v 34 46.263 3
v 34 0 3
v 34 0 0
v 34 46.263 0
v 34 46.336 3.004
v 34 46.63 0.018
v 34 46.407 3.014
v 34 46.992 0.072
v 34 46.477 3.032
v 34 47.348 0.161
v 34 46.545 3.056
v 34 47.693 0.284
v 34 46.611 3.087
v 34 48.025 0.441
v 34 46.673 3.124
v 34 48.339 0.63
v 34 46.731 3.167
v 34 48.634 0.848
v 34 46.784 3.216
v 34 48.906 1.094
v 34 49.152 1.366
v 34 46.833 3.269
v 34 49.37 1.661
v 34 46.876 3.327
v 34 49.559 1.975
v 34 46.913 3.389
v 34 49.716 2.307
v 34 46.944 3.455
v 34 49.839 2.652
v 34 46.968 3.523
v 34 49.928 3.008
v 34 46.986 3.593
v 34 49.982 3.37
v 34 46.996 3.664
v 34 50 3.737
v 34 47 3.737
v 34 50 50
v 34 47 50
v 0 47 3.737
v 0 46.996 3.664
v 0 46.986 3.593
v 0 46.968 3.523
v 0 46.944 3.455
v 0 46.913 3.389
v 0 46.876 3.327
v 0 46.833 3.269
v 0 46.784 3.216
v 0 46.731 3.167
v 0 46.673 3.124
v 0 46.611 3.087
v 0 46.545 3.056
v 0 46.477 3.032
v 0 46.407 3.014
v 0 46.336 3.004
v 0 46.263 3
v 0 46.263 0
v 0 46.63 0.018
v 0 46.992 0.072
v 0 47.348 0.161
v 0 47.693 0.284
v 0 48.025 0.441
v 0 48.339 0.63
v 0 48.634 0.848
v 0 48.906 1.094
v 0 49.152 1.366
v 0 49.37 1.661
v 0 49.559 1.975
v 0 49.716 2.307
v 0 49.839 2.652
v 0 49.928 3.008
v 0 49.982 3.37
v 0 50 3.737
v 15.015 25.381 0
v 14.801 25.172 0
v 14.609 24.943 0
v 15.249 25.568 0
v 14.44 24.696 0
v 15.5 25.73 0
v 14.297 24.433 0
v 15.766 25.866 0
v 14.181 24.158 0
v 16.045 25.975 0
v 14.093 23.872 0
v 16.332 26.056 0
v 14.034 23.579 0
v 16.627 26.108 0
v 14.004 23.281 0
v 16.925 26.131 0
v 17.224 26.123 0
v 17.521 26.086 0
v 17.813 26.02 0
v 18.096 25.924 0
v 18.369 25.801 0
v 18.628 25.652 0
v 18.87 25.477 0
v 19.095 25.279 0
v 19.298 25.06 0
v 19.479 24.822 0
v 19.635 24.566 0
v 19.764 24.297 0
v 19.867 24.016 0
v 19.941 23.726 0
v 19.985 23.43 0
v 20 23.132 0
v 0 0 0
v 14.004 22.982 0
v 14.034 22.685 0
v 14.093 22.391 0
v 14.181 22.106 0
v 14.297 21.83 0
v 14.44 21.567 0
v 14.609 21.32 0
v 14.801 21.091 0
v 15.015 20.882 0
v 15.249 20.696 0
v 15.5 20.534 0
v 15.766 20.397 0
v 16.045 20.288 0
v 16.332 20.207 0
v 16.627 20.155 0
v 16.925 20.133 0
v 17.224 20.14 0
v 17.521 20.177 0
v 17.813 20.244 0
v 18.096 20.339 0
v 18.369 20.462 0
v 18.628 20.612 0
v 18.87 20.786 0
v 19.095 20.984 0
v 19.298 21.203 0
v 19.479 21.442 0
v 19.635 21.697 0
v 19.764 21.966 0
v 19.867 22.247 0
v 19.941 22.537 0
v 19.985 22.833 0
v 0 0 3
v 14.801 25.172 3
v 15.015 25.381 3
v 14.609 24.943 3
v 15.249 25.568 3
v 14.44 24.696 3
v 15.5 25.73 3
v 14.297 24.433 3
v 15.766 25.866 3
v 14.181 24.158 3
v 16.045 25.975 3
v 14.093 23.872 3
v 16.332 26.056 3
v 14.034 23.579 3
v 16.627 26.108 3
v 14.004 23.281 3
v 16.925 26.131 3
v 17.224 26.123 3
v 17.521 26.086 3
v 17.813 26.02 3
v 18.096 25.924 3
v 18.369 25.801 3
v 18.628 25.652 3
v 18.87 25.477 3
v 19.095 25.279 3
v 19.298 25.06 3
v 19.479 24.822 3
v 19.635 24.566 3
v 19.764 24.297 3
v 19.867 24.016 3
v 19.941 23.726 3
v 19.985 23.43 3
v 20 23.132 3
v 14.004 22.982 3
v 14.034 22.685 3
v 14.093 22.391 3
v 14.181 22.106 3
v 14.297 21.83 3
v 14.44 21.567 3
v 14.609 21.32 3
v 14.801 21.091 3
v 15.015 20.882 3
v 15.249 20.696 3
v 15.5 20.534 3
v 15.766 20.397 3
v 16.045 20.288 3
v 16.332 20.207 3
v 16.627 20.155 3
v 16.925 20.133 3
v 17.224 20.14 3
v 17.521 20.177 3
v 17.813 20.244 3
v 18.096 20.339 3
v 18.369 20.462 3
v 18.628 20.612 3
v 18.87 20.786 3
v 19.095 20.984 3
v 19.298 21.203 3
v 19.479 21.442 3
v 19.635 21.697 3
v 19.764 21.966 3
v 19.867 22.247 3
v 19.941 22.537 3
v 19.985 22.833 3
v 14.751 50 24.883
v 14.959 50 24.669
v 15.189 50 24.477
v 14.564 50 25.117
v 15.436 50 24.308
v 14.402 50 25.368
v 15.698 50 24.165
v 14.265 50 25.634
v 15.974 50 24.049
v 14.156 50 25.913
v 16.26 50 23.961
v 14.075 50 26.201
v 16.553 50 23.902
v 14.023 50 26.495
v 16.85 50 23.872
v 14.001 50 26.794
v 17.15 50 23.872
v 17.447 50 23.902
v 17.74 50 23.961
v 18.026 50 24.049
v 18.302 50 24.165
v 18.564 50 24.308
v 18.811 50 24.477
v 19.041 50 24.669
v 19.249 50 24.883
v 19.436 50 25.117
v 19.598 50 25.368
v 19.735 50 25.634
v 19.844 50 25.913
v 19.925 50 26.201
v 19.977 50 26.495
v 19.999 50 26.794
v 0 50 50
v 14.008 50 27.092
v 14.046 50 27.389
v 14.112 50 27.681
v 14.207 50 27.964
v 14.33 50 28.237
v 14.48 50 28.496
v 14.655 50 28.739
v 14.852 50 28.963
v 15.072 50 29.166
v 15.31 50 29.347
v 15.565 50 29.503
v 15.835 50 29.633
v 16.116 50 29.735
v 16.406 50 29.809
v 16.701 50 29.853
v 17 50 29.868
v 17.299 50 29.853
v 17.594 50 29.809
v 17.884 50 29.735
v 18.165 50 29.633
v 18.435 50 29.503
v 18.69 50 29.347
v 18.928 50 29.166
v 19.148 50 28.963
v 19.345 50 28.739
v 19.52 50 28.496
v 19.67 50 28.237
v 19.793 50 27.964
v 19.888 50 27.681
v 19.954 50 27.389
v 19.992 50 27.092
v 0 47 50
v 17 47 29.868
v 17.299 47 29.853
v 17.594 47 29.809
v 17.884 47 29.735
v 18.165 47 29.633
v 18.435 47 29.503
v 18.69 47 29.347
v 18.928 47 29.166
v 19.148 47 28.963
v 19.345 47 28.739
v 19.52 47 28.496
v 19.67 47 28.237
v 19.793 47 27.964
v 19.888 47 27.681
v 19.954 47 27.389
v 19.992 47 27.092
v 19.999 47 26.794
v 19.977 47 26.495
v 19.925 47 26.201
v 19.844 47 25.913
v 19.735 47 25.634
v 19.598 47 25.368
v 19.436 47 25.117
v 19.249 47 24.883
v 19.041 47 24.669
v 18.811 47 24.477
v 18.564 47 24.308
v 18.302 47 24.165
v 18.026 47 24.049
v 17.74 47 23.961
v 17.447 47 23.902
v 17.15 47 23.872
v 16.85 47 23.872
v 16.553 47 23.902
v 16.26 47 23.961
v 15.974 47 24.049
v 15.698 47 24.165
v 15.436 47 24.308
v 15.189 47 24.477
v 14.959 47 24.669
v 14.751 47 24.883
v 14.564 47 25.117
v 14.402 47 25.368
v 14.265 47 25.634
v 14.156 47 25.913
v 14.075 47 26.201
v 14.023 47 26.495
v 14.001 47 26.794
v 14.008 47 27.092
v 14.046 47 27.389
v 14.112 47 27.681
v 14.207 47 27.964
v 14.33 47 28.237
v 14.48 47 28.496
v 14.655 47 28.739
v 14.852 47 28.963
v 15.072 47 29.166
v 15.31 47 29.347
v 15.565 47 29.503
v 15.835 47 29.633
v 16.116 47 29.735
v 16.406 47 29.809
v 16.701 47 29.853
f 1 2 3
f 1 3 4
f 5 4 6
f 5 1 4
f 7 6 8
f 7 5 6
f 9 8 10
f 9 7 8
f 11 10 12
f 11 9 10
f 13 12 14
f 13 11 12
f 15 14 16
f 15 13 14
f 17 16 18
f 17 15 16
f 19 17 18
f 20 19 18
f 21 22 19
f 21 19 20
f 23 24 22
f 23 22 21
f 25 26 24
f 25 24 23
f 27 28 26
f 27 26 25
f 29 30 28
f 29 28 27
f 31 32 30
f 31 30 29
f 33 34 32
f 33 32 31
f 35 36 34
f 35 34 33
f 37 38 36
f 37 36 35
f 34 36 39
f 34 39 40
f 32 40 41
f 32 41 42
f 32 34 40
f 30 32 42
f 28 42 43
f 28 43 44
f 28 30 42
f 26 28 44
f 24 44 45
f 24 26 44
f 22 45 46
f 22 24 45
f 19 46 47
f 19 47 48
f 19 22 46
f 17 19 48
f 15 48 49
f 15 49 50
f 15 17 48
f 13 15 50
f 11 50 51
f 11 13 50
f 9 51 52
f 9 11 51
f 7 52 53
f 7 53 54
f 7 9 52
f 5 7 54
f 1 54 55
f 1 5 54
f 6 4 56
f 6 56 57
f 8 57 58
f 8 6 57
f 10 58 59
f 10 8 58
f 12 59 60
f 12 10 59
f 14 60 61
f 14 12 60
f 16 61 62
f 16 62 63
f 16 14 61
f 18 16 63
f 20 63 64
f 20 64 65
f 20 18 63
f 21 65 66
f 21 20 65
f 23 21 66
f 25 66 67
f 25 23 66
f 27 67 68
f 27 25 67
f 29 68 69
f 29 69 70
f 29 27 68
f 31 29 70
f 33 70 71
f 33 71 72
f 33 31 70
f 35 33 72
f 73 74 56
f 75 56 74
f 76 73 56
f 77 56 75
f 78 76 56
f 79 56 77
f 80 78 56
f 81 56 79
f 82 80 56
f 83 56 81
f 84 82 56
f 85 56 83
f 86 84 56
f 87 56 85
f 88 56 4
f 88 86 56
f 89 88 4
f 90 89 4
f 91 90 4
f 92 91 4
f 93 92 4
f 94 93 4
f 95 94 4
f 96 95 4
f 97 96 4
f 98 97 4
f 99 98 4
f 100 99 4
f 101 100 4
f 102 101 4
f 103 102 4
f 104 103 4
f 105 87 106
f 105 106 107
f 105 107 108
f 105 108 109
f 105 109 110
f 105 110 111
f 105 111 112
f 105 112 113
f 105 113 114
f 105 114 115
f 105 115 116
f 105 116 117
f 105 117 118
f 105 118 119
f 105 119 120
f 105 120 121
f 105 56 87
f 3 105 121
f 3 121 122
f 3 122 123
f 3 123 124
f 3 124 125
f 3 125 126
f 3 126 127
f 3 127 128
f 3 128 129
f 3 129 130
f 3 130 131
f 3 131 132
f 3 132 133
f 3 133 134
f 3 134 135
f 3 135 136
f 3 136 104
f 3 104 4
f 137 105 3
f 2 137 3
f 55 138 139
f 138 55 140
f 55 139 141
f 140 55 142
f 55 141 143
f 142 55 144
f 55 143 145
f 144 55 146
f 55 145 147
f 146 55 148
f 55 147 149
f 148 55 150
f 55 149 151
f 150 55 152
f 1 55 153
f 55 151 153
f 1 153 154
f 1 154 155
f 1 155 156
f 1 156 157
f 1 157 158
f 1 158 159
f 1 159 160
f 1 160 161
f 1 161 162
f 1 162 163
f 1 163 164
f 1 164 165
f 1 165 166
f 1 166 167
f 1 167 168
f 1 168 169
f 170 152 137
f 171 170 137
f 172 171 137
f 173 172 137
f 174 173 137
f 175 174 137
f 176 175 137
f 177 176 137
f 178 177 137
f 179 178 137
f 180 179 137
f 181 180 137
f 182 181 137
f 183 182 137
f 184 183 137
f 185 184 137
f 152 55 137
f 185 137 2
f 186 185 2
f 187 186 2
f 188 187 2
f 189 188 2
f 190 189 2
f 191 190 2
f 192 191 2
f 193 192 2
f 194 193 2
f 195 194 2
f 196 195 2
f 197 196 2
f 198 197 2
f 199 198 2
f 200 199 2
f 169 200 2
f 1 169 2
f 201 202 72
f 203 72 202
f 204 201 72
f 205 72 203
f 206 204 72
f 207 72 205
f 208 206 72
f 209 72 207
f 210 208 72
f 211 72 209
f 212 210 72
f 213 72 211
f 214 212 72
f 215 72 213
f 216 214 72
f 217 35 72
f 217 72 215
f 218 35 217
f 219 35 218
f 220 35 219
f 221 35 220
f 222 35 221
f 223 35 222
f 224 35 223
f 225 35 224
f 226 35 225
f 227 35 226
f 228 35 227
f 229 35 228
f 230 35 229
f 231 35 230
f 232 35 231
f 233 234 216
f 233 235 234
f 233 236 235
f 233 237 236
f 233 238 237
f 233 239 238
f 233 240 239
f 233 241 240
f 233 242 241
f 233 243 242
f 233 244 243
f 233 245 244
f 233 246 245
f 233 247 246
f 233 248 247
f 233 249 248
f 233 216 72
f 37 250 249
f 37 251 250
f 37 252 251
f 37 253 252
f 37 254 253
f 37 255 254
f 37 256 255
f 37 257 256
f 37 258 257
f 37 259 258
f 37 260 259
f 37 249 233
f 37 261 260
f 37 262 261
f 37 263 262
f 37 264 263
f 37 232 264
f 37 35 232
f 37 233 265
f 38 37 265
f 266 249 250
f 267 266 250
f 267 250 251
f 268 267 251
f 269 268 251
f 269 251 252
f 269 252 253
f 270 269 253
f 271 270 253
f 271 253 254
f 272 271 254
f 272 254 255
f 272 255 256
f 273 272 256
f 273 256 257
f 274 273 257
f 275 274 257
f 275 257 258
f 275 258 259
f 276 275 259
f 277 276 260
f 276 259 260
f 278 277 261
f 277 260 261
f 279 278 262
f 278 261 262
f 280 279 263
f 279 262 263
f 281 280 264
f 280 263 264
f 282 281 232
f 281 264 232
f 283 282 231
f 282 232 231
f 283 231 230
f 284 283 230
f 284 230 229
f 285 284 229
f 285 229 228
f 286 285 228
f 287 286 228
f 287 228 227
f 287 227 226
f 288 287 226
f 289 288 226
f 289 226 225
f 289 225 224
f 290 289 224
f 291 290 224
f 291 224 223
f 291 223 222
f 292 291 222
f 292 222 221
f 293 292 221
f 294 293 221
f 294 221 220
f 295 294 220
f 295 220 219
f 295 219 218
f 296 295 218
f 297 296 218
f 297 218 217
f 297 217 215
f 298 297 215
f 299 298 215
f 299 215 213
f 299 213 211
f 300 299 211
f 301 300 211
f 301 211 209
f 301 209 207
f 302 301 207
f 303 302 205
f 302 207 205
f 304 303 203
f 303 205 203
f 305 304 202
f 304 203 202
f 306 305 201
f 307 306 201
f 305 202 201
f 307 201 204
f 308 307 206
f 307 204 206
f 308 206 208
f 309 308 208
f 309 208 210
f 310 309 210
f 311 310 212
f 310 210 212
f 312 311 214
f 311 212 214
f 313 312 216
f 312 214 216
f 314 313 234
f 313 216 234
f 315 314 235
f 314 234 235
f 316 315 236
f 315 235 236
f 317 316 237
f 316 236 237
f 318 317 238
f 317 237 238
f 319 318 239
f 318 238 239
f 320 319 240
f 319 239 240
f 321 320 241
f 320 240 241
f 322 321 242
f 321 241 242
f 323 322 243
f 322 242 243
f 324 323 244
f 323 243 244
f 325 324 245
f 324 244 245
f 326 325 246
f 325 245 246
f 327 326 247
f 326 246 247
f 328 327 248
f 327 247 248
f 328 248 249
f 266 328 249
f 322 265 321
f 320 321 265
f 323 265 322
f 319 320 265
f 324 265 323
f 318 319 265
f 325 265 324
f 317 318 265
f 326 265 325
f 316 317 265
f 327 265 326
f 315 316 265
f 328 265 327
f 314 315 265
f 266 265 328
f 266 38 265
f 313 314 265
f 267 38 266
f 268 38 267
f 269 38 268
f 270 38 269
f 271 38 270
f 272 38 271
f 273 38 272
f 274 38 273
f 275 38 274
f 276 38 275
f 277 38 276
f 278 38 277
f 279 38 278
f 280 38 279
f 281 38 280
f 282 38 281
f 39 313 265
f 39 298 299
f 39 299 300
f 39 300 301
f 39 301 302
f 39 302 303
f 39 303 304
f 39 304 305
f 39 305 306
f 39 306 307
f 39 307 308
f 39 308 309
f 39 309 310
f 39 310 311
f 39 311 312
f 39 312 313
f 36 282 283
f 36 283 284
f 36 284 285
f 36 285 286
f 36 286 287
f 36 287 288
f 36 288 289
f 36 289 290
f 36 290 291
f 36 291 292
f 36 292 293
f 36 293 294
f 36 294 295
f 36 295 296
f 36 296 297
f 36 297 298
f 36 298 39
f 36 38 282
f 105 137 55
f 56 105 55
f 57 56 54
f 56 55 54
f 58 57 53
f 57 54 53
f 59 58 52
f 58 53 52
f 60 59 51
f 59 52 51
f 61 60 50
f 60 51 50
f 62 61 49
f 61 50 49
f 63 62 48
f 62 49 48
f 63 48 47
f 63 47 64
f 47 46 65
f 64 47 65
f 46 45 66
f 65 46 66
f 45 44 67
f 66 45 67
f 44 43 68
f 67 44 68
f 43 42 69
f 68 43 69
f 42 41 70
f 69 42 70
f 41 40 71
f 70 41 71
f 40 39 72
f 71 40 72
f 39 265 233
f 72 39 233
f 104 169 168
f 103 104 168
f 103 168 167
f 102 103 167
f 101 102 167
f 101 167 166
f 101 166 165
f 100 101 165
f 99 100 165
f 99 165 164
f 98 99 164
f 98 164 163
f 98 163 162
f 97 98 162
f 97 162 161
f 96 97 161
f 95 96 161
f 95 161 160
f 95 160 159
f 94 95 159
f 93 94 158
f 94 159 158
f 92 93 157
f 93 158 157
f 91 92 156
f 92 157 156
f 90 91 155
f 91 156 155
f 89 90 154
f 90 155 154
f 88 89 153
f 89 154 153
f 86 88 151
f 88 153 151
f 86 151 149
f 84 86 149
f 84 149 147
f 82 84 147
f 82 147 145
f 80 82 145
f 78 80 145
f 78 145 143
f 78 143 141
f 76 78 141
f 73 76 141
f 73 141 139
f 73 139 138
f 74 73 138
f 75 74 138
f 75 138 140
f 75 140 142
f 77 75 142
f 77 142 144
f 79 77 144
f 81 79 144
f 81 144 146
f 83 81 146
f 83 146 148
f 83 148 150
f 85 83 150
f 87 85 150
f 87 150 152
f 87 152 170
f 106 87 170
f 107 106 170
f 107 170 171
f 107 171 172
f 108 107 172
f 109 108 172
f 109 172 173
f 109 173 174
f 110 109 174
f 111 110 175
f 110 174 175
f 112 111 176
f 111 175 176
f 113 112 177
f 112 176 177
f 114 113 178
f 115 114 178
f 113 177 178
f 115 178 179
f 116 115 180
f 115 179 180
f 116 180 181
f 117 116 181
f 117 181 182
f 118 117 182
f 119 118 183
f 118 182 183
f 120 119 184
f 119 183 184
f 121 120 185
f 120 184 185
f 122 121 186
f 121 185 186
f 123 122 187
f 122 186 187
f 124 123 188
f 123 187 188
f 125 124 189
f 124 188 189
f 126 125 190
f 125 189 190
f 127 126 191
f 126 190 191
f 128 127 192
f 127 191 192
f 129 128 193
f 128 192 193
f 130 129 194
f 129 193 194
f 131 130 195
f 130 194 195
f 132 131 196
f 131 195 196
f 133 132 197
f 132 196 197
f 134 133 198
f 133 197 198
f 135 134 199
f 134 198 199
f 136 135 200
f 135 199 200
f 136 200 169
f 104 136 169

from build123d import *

# Parameters (mm, degrees)
SKETCH1_W                    = 34
SKETCH1_H                    = 3
BASE_FLANGE1_DEPTH           = 50
EDGE_FLANGE1_STRIP_W         = 13.4732
EDGE_FLANGE1_STRIP_H         = 3
EDGE_FLANGE1_STRIP_CUT_DEPTH = 34
EDGE_FLANGE1_DEPTH           = 34
SKETCH9_R                    = 3
CUT_EXTRUDE1_DEPTH           = 10
SKETCH10_R                   = 3
CUT_EXTRUDE2_DEPTH           = 10


# Sheet-metal steps are written as plain solids
with BuildPart() as part:
    # Sketch1 → Base-Flange1 (new body)
    with BuildSketch(Plane(origin=(0, 0, 0), x_dir=(1, 0, 0), z_dir=(0, 1, 0))):
        with Locations((17, -1.5)):
            Rectangle(SKETCH1_W, SKETCH1_H)
    extrude(amount=BASE_FLANGE1_DEPTH)

    # Edge-Flange1 strip (across the edge) → Edge-Flange1 strip cut (cut)
    with BuildSketch(Plane(origin=(34, 50, 3), x_dir=(0, -1, 0), z_dir=(-1, 0, 0))):
        with Locations((-3, -1.5)):
            Rectangle(EDGE_FLANGE1_STRIP_W, EDGE_FLANGE1_STRIP_H)
    extrude(amount=EDGE_FLANGE1_STRIP_CUT_DEPTH, mode=Mode.SUBTRACT)

    # Edge-Flange1 section (across the edge) → Edge-Flange1 (add)
    with BuildSketch(Plane(origin=(34, 50, 3), x_dir=(0, -1, 0), z_dir=(-1, 0, 0))):
        with BuildLine():
            Line((0, 0.7366), (0, 47))
            Line((0, 47), (3, 47))
            Line((3, 47), (3, 0.7366))
            ThreePointArc((3, 0.7366), (3.215745145, 0.215745145), (3.7366, 0))
            Line((3.7366, 0), (3.7366, -3))
            ThreePointArc((3.7366, -3), (1.094424801, -1.905575199), (0, 0.7366))
        make_face()
    extrude(amount=EDGE_FLANGE1_DEPTH)

    # Sketch9 → Cut-Extrude1 (cut)
    with BuildSketch(Plane(origin=(0, 50, 0), x_dir=(1, 0, 0), z_dir=(0, 1, 0))):
        with Locations(Location((17, -26.8683, 0), (0, 0, 270))):
            Circle(SKETCH9_R)
    extrude(amount=-CUT_EXTRUDE1_DEPTH, mode=Mode.SUBTRACT)

    # Sketch10 → Cut-Extrude2 (cut)
    with BuildSketch(Plane.XY.offset(3)):
        with Locations((17, 23.1317)):
            Circle(SKETCH10_R)
    extrude(amount=-CUT_EXTRUDE2_DEPTH, mode=Mode.SUBTRACT)


solid = part.part
